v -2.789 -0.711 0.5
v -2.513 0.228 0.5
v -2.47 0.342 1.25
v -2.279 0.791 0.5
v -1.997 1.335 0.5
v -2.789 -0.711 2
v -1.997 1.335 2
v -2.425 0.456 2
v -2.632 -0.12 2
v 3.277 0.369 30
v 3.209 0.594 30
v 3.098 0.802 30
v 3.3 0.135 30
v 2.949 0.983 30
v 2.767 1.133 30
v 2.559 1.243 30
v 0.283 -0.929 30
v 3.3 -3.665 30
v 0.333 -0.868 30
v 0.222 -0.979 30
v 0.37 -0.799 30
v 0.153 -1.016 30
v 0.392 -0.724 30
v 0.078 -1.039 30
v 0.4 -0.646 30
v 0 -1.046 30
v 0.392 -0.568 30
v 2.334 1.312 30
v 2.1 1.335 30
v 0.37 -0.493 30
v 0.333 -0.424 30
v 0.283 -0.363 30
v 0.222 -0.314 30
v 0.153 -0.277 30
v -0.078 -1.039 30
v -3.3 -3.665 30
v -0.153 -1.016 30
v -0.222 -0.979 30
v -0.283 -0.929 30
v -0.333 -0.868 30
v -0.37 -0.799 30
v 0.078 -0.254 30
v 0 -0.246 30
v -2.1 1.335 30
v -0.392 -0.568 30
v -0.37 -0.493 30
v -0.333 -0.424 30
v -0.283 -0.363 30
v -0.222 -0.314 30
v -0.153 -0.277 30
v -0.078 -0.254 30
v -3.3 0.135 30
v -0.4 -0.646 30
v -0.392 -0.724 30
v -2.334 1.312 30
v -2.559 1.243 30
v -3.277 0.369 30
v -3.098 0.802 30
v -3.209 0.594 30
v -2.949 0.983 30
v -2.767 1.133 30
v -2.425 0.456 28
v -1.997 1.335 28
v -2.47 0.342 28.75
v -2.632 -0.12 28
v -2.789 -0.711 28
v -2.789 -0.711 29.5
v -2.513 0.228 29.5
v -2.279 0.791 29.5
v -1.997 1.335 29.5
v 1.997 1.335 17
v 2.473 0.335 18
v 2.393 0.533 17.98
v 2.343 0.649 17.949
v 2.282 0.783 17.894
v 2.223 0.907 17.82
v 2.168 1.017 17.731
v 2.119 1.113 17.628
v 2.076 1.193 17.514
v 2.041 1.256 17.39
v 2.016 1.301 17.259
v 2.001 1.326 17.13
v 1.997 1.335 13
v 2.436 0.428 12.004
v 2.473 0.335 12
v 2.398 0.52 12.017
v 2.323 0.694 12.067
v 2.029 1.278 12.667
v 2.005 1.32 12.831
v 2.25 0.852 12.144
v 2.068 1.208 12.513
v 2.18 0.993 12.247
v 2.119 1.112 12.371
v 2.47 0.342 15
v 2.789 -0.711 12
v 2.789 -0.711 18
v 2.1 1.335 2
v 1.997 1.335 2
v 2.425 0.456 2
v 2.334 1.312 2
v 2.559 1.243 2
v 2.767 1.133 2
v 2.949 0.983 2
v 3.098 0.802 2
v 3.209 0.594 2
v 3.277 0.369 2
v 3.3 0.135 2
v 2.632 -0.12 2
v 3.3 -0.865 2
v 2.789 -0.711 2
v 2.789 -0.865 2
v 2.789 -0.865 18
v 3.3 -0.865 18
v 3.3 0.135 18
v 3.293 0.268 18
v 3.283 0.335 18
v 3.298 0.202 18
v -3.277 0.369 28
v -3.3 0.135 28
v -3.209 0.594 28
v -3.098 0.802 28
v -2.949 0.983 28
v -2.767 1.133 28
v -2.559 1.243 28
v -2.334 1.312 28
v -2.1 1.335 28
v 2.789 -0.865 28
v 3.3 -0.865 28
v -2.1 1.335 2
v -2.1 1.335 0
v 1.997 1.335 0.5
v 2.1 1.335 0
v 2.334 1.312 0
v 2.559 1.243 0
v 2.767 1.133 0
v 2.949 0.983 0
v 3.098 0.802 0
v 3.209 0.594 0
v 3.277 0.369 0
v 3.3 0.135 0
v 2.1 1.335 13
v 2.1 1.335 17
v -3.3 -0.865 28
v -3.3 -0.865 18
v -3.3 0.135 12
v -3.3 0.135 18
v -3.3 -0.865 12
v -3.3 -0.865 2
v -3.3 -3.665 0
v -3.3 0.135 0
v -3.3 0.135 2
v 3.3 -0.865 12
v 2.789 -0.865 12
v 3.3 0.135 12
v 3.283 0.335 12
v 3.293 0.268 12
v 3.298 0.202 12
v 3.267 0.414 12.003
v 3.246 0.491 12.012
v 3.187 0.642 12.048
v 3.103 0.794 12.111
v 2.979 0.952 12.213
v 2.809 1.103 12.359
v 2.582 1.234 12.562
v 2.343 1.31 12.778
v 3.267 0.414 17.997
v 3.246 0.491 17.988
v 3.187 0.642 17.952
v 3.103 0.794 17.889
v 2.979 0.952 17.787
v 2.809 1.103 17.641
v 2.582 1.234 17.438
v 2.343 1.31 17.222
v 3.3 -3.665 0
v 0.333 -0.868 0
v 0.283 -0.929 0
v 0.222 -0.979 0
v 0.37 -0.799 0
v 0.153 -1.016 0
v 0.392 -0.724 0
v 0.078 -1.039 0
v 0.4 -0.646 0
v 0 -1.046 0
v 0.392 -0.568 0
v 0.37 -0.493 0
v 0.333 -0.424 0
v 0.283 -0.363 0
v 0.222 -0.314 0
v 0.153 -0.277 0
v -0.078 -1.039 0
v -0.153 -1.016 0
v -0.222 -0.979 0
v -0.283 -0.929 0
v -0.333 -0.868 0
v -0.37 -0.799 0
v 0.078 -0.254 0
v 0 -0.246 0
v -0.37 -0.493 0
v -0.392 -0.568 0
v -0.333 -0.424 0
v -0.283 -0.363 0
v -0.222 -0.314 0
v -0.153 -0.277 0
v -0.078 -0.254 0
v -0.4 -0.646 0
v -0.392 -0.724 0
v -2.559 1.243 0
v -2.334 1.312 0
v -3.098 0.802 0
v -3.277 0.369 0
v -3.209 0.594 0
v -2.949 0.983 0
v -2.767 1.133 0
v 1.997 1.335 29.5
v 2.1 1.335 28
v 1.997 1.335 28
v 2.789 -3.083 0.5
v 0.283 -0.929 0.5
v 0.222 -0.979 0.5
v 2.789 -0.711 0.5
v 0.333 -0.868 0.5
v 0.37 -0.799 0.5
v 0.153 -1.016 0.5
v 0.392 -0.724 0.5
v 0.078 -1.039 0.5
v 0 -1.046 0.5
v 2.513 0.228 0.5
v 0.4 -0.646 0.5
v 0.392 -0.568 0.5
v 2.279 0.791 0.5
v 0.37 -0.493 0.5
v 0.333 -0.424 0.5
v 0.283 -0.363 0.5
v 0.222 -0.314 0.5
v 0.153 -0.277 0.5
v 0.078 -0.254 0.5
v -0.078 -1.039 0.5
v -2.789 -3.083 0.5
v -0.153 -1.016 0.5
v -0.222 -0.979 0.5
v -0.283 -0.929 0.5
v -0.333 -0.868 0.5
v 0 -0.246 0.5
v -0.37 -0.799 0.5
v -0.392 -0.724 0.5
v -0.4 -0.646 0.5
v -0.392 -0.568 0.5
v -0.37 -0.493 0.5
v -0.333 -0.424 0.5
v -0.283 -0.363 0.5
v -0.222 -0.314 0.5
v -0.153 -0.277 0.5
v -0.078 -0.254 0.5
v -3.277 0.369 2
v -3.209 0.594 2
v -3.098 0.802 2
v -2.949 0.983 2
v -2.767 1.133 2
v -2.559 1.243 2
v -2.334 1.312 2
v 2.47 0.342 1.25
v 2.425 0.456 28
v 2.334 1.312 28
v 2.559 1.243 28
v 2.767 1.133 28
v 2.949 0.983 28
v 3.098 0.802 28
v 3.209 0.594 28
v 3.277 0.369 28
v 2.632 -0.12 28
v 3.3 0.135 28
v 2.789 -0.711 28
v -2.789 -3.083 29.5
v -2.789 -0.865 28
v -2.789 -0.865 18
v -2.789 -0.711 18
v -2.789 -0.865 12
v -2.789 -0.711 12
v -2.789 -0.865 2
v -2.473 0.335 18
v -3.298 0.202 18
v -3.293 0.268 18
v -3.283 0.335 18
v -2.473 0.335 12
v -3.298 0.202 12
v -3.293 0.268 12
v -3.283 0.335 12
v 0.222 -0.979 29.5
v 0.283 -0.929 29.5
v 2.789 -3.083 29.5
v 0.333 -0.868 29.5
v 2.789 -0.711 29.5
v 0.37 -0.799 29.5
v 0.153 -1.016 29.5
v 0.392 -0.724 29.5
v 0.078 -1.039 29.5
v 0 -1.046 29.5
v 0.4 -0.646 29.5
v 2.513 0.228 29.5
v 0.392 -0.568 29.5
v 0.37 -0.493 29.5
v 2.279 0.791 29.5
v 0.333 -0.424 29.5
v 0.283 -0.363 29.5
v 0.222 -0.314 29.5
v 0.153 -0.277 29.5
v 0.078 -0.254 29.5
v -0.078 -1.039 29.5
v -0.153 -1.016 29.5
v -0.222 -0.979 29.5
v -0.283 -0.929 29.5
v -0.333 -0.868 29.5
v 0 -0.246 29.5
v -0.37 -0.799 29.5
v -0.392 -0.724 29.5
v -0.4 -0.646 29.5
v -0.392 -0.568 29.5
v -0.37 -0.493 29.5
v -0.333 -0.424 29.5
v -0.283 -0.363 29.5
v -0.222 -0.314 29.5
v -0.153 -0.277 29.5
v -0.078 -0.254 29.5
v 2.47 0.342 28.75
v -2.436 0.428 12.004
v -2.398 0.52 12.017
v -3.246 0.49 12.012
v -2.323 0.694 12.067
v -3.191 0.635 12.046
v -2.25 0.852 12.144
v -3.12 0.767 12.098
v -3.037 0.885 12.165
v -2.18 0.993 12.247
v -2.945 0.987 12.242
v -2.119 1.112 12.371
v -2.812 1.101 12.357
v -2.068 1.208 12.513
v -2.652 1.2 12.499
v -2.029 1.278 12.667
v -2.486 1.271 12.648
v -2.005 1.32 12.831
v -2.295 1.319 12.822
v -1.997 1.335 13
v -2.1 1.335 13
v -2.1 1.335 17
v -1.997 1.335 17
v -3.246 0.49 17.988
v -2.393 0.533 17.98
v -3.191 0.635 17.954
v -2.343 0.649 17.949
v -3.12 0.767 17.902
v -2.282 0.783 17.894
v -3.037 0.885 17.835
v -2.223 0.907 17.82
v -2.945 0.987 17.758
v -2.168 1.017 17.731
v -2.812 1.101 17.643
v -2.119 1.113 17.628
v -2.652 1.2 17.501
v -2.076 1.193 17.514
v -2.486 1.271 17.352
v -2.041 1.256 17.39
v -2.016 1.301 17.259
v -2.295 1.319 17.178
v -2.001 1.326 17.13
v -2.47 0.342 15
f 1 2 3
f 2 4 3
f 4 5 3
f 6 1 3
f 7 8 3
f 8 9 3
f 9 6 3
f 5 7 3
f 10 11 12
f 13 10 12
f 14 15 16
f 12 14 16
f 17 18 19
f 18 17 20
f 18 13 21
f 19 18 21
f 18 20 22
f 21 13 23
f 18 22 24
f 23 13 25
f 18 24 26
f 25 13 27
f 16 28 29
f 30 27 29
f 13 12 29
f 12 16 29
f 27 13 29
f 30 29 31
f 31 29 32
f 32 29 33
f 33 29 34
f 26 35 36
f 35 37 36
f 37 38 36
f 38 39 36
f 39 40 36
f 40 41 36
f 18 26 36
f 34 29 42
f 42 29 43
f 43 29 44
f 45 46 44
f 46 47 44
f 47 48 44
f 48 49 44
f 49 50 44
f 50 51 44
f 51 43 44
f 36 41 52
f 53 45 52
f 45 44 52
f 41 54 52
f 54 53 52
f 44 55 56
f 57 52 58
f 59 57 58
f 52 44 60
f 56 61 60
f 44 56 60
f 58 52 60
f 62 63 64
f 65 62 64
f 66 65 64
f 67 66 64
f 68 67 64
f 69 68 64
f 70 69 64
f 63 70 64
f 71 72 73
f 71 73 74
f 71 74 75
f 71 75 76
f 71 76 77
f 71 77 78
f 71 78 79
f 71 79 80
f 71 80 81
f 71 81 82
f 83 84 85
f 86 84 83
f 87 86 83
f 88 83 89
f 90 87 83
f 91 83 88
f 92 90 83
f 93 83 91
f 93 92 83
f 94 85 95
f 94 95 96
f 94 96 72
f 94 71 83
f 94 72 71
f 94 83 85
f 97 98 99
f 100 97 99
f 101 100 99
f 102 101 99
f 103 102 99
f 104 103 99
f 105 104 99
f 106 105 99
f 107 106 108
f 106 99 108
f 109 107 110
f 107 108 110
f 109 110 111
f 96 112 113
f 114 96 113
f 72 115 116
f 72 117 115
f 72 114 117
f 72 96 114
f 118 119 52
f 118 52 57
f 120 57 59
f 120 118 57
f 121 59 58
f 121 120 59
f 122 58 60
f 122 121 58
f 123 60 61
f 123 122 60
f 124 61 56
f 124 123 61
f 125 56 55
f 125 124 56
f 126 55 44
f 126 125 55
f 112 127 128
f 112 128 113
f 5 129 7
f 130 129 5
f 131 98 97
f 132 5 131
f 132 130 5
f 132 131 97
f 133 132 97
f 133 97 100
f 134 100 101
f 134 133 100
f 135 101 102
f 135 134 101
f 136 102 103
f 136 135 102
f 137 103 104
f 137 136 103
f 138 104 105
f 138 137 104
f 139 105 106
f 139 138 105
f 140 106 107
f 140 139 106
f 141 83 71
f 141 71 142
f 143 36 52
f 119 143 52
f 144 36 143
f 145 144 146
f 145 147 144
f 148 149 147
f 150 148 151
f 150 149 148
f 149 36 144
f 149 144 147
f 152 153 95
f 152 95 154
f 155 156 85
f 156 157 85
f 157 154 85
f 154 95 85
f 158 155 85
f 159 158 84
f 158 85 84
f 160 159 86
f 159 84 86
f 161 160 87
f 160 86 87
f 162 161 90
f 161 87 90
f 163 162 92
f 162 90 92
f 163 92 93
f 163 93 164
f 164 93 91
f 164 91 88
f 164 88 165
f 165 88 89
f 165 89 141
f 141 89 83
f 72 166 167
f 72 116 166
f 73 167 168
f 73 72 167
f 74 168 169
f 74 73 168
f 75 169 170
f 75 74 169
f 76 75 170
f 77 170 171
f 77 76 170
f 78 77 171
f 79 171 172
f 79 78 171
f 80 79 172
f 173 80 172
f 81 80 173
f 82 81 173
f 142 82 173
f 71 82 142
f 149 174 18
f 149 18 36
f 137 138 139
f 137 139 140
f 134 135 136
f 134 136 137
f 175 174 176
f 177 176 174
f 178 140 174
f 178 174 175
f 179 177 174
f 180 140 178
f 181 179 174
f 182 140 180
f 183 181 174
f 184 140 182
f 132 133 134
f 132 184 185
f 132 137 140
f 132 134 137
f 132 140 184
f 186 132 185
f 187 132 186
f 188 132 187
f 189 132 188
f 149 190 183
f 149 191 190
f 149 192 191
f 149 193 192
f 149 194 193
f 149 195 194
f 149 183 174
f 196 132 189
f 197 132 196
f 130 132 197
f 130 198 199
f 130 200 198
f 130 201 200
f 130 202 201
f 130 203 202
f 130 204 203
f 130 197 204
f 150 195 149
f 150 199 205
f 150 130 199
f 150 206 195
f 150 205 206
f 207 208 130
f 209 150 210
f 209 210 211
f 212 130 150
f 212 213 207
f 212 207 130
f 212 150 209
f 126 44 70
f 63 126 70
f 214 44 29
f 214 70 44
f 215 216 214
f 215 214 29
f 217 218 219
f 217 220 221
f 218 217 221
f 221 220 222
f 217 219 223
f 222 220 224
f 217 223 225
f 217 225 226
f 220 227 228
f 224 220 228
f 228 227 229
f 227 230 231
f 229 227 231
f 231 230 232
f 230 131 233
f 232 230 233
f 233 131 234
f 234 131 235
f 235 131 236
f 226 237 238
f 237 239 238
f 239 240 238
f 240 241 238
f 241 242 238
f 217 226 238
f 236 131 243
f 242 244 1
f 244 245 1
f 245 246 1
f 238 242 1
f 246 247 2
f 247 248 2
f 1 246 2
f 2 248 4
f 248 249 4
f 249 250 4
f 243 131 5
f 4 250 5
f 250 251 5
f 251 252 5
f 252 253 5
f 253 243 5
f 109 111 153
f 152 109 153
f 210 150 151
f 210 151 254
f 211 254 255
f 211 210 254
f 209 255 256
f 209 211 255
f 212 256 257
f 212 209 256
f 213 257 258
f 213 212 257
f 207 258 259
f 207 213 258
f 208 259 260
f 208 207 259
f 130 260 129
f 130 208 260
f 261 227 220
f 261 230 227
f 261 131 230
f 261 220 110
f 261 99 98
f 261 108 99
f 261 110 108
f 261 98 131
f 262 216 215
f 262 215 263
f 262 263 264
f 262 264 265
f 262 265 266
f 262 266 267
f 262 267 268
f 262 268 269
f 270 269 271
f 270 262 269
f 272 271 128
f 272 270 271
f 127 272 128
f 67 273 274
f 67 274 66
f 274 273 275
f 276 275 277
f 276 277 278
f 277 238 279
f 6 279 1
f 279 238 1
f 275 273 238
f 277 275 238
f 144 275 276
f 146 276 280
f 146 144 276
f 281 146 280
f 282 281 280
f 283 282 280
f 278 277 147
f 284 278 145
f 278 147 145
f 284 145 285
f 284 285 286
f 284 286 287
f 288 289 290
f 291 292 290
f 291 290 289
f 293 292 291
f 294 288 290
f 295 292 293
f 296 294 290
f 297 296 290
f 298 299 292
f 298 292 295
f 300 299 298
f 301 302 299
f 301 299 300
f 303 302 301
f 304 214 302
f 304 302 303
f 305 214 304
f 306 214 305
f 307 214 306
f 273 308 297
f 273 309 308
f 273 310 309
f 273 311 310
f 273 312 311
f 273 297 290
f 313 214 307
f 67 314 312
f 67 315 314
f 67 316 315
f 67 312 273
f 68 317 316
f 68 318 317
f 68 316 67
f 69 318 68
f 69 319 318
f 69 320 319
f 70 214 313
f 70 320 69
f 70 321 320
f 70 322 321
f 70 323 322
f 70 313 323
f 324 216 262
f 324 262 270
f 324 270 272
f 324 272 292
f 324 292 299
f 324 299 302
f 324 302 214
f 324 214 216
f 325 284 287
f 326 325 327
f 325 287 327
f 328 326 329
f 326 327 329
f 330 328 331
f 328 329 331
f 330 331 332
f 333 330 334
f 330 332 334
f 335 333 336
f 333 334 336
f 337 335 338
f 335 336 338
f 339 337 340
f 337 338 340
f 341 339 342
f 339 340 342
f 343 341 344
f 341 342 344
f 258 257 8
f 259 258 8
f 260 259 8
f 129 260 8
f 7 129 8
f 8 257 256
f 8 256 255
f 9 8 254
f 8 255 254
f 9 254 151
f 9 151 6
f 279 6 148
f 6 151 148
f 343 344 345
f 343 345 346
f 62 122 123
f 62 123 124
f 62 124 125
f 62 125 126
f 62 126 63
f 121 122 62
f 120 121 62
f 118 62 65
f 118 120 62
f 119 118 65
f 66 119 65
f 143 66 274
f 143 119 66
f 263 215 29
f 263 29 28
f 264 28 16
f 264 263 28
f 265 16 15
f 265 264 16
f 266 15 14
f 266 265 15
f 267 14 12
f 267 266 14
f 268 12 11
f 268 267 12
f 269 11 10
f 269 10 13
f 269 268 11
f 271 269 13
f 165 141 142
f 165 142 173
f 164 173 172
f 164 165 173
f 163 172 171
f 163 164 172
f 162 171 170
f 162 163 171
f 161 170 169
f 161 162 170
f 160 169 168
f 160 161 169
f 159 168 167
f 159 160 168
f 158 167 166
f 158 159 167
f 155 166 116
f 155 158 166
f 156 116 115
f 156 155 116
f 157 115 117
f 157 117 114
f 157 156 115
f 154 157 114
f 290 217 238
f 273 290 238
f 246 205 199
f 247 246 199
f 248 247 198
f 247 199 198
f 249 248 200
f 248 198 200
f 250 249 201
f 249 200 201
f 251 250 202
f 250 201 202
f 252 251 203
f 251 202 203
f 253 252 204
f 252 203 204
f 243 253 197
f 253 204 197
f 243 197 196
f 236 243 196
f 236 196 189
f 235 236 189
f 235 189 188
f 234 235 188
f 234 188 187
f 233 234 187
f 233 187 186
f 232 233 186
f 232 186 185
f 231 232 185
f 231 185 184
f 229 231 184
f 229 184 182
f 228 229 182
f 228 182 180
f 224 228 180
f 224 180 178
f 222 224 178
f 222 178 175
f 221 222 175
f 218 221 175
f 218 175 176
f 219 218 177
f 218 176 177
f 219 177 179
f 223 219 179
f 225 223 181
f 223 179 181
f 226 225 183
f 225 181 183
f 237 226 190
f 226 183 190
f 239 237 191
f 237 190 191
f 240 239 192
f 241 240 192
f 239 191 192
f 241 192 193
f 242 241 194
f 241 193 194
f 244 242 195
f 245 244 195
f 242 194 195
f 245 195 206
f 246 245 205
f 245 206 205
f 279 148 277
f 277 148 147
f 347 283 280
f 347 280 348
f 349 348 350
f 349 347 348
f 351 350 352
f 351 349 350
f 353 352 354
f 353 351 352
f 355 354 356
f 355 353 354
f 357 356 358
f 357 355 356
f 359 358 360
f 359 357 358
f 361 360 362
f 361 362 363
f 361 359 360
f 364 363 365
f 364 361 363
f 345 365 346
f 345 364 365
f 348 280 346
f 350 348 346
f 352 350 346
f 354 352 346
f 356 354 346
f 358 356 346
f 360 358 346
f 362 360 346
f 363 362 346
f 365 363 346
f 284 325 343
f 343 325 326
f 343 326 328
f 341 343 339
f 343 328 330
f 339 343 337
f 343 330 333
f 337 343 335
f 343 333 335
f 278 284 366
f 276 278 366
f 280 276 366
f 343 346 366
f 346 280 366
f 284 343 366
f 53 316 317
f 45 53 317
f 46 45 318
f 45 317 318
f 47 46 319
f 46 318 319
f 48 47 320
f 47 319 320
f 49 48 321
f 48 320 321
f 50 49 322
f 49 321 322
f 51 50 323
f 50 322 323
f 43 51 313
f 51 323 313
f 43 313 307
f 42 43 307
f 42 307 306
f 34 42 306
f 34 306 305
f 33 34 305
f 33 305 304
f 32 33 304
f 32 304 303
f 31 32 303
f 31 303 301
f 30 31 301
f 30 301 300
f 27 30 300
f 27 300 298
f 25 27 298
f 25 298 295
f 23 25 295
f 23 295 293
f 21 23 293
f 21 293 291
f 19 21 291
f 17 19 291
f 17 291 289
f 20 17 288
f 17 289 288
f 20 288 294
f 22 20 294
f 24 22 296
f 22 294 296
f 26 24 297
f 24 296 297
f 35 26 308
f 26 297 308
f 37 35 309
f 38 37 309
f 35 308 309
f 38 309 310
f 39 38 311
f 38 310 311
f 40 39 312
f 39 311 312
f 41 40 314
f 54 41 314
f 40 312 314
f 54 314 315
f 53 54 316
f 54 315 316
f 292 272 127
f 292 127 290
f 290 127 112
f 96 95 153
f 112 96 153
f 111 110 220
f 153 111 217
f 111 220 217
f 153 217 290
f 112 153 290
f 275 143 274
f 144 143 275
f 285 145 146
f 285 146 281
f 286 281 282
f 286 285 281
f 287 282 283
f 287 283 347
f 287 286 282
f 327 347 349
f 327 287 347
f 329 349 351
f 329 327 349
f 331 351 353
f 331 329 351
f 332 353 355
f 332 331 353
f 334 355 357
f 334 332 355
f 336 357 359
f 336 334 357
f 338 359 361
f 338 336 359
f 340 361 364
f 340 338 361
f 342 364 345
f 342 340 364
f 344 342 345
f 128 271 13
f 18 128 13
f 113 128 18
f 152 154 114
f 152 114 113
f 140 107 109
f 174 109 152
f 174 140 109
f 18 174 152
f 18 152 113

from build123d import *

# Parameters (mm, degrees)
BOSS_EXTRUDE1_DEPTH     = 30
CUT_EXTRUDE1_DEPTH      = 20
CUT_EXTRUDE1_DEPTH_BACK = 7
CUT_EXTRUDE3_START      = -0.5
CUT_EXTRUDE3_DEPTH      = 29
SKETCH4_R               = 0.4
CUT_EXTRUDE4_DEPTH      = 33


with BuildPart() as part:
    # Sketch1 → Boss-Extrude1 (new body)
    with BuildSketch(Plane.XY):
        with BuildLine():
            Line((-2.1, 1.334816112), (2.1, 1.334816112))
            ThreePointArc((2.1, 1.334816112), (2.948528137, 0.98334425), (3.3, 0.134816112))
            Line((3.3, 0.134816112), (3.3, -3.665183888))
            Line((3.3, -3.665183888), (-3.3, -3.665183888))
            Line((-3.3, -3.665183888), (-3.3, 0.134816112))
            ThreePointArc((-3.3, 0.134816112), (-2.948528137, 0.98334425), (-2.1, 1.334816112))
        make_face()
    extrude(amount=BOSS_EXTRUDE1_DEPTH)

    # Sketch2 → Cut-Extrude1 (cut, two sides: drawn at the far end of the back side and taken through both)
    with BuildSketch(Plane(origin=(0, 0, 0), x_dir=(0, 0, -1), z_dir=(1, 0, 0)).offset(-CUT_EXTRUDE1_DEPTH_BACK)):
        with BuildLine():
            Line((-2, 1.334816112), (-2, -0.865183888))
            Line((-2, -0.865183888), (-12, -0.865183888))
            Line((-12, -0.865183888), (-12, 0.334816112))
            ThreePointArc((-12, 0.334816112), (-12.292893219, 1.041922893), (-13, 1.334816112))
            Line((-13, 1.334816112), (-2, 1.334816112))
        make_face()
        with BuildLine():
            Line((-17, 1.334816112), (-28, 1.334816112))
            Line((-28, 1.334816112), (-28, -0.865183888))
            Line((-28, -0.865183888), (-18, -0.865183888))
            Line((-18, -0.865183888), (-18, 0.334816112))
            ThreePointArc((-18, 0.334816112), (-17.707106781, 1.041922893), (-17, 1.334816112))
        make_face()
    extrude(amount=CUT_EXTRUDE1_DEPTH + CUT_EXTRUDE1_DEPTH_BACK, mode=Mode.SUBTRACT)

    # Sketch3 → Cut-Extrude3 (cut)
    with BuildSketch(Plane(origin=(0, 0, 0), x_dir=(-1, 0, 0), z_dir=(0, 0, -1)).offset(CUT_EXTRUDE3_START)):
        with BuildLine():
            Line((-2.789484842, -3.082504219), (2.789484842, -3.082504219))
            Line((2.789484842, -3.082504219), (2.789484842, -0.711081704))
            add(Edge.make_bspline(
                [(2.789484842, -0.711081704), (2.547062941, 0.37267851), (1.996608014, 1.334816112)],
                knots=[0, 0, 0, 1, 1, 1], degree=2))
            Line((1.996608014, 1.334816112), (-1.996608014, 1.334816112))
            add(Edge.make_bspline(
                [(-2.789484842, -0.711081704), (-2.547062941, 0.37267851), (-1.996608014, 1.334816112)],
                knots=[0, 0, 0, 1, 1, 1], degree=2))
            Line((-2.789484842, -0.711081704), (-2.789484842, -3.082504219))
        make_face()
    extrude(amount=-CUT_EXTRUDE3_DEPTH, mode=Mode.SUBTRACT)

    # Sketch4 → Cut-Extrude4 (cut)
    with BuildSketch(Plane(origin=(0, 0, 0), x_dir=(-1, 0, 0), z_dir=(0, 0, -1))):
        with Locations((0, -0.646209964)):
            Circle(SKETCH4_R)
    extrude(amount=-CUT_EXTRUDE4_DEPTH, mode=Mode.SUBTRACT)


solid = part.part
